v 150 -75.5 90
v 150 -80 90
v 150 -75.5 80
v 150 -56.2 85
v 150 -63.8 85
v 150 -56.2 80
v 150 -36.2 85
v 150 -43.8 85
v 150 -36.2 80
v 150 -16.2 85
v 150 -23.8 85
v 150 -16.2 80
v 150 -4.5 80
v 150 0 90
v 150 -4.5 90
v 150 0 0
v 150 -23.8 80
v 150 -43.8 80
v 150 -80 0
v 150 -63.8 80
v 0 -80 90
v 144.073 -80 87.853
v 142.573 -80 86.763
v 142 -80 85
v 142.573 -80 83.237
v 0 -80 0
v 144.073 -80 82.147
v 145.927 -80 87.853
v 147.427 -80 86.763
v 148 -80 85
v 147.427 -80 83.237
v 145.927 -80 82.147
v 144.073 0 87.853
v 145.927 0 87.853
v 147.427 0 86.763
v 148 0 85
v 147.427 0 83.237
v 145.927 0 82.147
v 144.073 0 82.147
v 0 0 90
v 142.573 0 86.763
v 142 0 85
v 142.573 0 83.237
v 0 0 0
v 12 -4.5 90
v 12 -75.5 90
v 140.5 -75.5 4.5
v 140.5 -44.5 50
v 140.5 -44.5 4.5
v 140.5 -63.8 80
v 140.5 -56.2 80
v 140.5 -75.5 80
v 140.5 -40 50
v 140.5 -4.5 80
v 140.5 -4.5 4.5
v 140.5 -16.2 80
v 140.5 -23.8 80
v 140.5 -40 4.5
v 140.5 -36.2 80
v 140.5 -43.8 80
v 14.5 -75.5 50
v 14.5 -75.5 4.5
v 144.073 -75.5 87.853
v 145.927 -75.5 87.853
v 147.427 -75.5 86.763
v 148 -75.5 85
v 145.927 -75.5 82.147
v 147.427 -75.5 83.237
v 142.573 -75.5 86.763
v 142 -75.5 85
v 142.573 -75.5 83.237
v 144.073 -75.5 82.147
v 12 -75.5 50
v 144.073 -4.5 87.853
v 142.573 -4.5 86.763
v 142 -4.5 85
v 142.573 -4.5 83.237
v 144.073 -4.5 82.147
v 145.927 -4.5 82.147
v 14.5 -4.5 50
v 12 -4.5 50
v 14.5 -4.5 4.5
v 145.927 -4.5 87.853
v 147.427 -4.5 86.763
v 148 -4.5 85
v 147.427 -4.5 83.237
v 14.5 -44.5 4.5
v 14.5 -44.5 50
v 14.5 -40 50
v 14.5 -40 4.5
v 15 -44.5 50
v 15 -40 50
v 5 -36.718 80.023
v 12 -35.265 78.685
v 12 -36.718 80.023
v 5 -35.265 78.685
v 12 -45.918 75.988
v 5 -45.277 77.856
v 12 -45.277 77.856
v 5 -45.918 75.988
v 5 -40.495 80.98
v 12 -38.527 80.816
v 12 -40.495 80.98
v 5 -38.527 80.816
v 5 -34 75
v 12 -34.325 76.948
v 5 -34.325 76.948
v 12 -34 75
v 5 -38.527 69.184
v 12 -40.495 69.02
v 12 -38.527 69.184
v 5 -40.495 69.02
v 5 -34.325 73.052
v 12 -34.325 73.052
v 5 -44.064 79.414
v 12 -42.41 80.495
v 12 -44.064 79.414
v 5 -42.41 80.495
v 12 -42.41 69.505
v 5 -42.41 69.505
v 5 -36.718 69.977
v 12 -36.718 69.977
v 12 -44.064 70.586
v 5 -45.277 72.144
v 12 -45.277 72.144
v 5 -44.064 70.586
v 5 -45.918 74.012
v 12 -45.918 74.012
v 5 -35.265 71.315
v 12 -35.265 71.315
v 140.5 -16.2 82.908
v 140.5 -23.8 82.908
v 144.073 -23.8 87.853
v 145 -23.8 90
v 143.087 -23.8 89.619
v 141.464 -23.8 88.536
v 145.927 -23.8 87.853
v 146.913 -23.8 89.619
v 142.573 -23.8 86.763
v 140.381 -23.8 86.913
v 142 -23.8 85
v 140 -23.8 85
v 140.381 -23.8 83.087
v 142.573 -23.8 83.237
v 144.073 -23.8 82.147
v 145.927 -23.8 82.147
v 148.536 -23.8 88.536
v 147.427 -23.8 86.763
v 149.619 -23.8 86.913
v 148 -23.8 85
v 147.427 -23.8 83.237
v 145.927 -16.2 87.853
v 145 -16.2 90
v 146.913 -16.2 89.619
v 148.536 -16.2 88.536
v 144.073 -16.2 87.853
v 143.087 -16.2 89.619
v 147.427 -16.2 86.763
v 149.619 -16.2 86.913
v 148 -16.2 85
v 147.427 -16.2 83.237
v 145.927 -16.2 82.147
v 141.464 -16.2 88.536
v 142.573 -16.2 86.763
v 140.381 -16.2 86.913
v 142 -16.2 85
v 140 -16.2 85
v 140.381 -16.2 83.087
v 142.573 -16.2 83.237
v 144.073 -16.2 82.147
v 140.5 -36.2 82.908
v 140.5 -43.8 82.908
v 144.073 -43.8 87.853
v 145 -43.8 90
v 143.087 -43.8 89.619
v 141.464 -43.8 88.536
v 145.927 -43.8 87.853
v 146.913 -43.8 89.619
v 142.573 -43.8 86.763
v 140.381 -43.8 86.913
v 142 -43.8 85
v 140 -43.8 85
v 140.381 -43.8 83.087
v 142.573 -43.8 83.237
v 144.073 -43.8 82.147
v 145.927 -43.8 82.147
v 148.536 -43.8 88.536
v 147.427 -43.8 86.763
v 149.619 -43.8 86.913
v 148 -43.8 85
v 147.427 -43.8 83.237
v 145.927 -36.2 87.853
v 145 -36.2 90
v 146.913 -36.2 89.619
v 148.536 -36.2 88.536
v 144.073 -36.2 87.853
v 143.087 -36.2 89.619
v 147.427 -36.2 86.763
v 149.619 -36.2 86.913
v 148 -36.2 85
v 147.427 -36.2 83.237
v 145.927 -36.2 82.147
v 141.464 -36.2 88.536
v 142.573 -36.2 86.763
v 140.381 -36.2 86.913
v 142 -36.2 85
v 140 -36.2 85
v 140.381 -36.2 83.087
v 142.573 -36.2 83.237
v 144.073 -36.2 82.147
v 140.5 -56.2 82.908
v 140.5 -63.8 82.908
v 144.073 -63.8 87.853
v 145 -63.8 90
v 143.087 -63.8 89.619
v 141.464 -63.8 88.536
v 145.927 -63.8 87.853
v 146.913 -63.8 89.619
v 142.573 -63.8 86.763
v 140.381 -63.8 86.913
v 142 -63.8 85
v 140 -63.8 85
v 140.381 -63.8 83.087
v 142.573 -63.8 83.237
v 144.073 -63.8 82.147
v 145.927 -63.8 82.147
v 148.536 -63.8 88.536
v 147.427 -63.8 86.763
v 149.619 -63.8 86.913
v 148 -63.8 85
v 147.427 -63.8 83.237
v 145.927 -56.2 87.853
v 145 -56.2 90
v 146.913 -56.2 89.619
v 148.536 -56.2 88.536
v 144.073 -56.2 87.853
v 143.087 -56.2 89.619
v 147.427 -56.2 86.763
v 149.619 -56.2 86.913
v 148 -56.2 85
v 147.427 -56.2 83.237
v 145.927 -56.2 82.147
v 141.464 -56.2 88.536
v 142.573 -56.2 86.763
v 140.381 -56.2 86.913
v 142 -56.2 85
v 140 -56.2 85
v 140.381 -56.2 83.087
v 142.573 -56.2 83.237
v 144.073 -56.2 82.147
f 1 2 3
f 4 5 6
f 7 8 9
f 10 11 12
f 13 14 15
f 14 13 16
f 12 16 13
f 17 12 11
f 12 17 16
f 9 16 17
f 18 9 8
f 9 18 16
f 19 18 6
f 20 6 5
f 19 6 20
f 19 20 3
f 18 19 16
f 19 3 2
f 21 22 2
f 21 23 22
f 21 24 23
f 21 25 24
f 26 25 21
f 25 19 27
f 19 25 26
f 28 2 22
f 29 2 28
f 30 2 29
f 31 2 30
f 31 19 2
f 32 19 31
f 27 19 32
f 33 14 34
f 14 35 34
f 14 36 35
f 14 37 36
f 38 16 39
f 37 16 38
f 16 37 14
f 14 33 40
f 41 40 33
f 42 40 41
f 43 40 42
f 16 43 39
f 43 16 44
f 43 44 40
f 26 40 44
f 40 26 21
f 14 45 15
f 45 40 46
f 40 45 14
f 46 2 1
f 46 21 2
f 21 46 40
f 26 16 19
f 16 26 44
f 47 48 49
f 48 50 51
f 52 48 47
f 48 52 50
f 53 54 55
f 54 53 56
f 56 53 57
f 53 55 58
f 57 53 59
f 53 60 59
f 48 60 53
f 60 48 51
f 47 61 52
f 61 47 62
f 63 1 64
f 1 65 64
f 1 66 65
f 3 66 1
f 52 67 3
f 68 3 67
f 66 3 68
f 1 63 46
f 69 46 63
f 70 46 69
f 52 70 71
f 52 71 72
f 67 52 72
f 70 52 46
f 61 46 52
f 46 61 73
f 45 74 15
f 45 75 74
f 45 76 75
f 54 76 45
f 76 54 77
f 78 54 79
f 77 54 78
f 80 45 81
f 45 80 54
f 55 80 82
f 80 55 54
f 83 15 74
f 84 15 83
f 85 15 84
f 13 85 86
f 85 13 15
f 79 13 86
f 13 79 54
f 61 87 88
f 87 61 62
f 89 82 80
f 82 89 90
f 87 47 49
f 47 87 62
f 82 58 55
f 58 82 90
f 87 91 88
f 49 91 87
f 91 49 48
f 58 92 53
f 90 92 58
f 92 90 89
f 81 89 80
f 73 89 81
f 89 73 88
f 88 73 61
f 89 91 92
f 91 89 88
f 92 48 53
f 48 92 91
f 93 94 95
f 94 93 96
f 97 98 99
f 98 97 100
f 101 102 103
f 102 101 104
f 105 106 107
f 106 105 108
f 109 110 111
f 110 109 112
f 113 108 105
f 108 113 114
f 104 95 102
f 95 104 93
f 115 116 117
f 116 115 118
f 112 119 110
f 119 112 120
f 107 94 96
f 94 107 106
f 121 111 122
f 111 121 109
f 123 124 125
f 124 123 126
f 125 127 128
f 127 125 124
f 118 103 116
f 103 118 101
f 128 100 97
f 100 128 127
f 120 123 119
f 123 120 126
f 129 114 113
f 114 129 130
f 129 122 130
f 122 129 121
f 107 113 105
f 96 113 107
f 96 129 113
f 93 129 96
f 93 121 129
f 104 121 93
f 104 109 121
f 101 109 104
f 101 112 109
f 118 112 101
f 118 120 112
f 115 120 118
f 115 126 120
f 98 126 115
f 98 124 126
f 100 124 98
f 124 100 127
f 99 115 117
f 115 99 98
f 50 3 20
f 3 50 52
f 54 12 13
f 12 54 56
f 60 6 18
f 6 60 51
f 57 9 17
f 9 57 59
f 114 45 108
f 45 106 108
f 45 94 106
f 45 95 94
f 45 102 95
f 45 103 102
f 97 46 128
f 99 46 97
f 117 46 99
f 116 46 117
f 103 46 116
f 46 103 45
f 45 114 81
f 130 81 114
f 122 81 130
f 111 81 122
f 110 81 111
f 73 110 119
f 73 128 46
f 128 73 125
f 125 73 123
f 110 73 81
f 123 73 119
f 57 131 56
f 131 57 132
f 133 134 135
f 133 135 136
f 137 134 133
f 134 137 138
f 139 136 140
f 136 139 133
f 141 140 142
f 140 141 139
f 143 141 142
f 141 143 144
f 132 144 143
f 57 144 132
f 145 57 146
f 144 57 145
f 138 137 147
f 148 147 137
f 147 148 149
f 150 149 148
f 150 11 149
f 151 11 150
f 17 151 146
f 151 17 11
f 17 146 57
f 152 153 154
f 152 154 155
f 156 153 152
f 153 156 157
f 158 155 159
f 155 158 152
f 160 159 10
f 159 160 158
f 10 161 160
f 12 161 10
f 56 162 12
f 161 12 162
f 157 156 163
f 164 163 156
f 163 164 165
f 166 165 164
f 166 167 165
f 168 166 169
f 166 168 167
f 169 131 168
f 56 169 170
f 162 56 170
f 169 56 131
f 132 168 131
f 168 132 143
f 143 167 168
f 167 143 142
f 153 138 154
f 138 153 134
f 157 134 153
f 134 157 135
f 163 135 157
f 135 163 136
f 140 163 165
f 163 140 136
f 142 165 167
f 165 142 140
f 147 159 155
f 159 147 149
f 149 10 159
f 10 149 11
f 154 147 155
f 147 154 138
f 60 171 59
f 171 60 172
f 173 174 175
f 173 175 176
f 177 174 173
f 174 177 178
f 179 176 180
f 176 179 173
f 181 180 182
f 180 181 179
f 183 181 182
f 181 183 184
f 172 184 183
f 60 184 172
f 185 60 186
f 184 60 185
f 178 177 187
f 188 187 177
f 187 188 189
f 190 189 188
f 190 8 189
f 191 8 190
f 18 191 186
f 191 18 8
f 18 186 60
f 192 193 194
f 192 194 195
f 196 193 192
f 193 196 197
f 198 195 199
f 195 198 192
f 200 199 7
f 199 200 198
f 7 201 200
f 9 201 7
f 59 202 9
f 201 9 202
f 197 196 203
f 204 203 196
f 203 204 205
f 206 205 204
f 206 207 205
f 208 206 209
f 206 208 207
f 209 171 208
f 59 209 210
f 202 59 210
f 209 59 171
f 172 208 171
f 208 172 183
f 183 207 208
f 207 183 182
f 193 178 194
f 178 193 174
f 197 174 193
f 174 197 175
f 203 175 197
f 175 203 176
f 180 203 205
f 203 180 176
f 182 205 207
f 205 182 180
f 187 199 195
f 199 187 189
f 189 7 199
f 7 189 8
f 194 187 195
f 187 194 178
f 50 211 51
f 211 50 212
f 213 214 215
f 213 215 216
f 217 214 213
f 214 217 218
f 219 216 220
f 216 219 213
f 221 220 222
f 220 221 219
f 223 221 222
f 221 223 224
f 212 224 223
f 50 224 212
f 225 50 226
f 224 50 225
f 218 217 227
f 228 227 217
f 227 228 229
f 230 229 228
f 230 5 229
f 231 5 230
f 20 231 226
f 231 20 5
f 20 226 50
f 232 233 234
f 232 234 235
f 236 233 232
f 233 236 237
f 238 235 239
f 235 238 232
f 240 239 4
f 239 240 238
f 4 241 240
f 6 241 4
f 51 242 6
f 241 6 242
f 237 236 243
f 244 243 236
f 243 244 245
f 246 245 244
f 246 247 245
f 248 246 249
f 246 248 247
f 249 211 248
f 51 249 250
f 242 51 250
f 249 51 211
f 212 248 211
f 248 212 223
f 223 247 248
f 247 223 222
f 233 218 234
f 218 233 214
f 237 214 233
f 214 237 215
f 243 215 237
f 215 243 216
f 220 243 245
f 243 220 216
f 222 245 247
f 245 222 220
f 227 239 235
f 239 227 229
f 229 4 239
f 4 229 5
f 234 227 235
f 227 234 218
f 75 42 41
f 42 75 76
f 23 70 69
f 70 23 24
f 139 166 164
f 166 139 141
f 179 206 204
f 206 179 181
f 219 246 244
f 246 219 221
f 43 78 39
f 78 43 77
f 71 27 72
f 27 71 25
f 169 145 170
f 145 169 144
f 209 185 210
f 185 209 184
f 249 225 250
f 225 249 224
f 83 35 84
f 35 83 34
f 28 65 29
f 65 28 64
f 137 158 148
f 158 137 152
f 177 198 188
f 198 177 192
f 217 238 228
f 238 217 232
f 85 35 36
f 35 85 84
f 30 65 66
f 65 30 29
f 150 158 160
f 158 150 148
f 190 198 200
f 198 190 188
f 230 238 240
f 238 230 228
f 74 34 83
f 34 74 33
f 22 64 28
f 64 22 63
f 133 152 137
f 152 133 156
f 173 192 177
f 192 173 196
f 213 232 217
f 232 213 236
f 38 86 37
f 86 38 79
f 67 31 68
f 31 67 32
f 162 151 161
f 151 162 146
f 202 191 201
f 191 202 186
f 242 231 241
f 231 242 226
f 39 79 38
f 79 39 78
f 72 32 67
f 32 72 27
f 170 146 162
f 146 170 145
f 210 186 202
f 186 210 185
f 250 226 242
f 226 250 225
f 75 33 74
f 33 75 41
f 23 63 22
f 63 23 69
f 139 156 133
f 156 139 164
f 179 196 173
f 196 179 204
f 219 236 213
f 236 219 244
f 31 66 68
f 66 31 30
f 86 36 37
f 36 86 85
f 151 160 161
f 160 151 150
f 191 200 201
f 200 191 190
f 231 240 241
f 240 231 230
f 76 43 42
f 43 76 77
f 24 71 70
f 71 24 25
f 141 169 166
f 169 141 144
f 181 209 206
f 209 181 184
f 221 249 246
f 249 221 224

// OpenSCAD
//=======Customizable Parameter=======
width = 150;    //Container Width
height = 80;    //Container Height
depth = 90;     //Container "Depth"
off = 5;        //Border Thickness
numshelf = 2;   //Number of Shelf inside   
//==================================

//=======Constant, Do not edit========
doorOff=0.5;
hingeOffset=1.2;
//==================================

//Container Outline
module container_comp(width=200,height=80,depth=80,off=5){
difference() {
cube([width,depth,height]);
translate([off+10-doorOff,off-doorOff,off-doorOff]) cube([width-off*2-15+2*doorOff,depth-off+2*doorOff,height-off*2+2*doorOff]);
}
for (i=[1:numshelf-1]){
    divider((height)*i/numshelf,width,depth,off-doorOff);
}
}

//Shelf Divider
module divider(y=50,width=200,depth=80,thickness=5){
    translate([thickness+10,thickness,y]) cube([width-thickness*2-10,depth-45+doorOff,thickness]);
}

//Hinge
module hinge(x,y,z,hingeHeight){
    translate([x,y,z])
    rotate([0,0,180])
    
    union(){
       translate ([-5,0,0])cube([10-doorOff,5,hingeHeight]); 
       cylinder(hingeHeight,5,5,false);
    }
       
    
}
//Hinge Position Calculation
module addhinge(x,y,z,hingeHeight,totalHeight){
    totalhinge= floor(totalHeight/(2*hingeHeight));
    echo(totalhinge);
    for (i = [0:totalhinge-1]){
        z2 = z + i*hingeHeight*2;
        hinge(x,y,z2+hingeOffset,hingeHeight-hingeOffset*2);
    }

}

//Container with hinge added
module container_solid(width=150,height=80,depth=80,off=5){
    difference() {
container_comp(width,height,depth,off);
    union(){
translate([5,depth-15,height/2]) rotate([0,90,0]) cylinder(15,6,6,false);
       translate([width-off-5,depth-10,off-doorOff]) cube([off+5,10,height-off*2+2*doorOff]);
        translate([15-3,depth-40,off-doorOff])cube([off-2,40,height-off*2+doorOff*2]);
    }
}
totalHeight = height-off*2;
    hingeHeight = 10;
    x = width-5;
    y = depth-5;
    z = 10+off;
addhinge(x,y,z,hingeHeight,totalHeight);

}

//Actual Container Module. Rotated to printing-ready position
module container(width=150,height=80,depth=80,off=5){
rotate([90,0,0])difference(){
    container_solid(width,height,depth,off);
    translate([width-5,depth-5,0])cylinder(height,3,3,false);
}
}

container(width,height,depth,off);
